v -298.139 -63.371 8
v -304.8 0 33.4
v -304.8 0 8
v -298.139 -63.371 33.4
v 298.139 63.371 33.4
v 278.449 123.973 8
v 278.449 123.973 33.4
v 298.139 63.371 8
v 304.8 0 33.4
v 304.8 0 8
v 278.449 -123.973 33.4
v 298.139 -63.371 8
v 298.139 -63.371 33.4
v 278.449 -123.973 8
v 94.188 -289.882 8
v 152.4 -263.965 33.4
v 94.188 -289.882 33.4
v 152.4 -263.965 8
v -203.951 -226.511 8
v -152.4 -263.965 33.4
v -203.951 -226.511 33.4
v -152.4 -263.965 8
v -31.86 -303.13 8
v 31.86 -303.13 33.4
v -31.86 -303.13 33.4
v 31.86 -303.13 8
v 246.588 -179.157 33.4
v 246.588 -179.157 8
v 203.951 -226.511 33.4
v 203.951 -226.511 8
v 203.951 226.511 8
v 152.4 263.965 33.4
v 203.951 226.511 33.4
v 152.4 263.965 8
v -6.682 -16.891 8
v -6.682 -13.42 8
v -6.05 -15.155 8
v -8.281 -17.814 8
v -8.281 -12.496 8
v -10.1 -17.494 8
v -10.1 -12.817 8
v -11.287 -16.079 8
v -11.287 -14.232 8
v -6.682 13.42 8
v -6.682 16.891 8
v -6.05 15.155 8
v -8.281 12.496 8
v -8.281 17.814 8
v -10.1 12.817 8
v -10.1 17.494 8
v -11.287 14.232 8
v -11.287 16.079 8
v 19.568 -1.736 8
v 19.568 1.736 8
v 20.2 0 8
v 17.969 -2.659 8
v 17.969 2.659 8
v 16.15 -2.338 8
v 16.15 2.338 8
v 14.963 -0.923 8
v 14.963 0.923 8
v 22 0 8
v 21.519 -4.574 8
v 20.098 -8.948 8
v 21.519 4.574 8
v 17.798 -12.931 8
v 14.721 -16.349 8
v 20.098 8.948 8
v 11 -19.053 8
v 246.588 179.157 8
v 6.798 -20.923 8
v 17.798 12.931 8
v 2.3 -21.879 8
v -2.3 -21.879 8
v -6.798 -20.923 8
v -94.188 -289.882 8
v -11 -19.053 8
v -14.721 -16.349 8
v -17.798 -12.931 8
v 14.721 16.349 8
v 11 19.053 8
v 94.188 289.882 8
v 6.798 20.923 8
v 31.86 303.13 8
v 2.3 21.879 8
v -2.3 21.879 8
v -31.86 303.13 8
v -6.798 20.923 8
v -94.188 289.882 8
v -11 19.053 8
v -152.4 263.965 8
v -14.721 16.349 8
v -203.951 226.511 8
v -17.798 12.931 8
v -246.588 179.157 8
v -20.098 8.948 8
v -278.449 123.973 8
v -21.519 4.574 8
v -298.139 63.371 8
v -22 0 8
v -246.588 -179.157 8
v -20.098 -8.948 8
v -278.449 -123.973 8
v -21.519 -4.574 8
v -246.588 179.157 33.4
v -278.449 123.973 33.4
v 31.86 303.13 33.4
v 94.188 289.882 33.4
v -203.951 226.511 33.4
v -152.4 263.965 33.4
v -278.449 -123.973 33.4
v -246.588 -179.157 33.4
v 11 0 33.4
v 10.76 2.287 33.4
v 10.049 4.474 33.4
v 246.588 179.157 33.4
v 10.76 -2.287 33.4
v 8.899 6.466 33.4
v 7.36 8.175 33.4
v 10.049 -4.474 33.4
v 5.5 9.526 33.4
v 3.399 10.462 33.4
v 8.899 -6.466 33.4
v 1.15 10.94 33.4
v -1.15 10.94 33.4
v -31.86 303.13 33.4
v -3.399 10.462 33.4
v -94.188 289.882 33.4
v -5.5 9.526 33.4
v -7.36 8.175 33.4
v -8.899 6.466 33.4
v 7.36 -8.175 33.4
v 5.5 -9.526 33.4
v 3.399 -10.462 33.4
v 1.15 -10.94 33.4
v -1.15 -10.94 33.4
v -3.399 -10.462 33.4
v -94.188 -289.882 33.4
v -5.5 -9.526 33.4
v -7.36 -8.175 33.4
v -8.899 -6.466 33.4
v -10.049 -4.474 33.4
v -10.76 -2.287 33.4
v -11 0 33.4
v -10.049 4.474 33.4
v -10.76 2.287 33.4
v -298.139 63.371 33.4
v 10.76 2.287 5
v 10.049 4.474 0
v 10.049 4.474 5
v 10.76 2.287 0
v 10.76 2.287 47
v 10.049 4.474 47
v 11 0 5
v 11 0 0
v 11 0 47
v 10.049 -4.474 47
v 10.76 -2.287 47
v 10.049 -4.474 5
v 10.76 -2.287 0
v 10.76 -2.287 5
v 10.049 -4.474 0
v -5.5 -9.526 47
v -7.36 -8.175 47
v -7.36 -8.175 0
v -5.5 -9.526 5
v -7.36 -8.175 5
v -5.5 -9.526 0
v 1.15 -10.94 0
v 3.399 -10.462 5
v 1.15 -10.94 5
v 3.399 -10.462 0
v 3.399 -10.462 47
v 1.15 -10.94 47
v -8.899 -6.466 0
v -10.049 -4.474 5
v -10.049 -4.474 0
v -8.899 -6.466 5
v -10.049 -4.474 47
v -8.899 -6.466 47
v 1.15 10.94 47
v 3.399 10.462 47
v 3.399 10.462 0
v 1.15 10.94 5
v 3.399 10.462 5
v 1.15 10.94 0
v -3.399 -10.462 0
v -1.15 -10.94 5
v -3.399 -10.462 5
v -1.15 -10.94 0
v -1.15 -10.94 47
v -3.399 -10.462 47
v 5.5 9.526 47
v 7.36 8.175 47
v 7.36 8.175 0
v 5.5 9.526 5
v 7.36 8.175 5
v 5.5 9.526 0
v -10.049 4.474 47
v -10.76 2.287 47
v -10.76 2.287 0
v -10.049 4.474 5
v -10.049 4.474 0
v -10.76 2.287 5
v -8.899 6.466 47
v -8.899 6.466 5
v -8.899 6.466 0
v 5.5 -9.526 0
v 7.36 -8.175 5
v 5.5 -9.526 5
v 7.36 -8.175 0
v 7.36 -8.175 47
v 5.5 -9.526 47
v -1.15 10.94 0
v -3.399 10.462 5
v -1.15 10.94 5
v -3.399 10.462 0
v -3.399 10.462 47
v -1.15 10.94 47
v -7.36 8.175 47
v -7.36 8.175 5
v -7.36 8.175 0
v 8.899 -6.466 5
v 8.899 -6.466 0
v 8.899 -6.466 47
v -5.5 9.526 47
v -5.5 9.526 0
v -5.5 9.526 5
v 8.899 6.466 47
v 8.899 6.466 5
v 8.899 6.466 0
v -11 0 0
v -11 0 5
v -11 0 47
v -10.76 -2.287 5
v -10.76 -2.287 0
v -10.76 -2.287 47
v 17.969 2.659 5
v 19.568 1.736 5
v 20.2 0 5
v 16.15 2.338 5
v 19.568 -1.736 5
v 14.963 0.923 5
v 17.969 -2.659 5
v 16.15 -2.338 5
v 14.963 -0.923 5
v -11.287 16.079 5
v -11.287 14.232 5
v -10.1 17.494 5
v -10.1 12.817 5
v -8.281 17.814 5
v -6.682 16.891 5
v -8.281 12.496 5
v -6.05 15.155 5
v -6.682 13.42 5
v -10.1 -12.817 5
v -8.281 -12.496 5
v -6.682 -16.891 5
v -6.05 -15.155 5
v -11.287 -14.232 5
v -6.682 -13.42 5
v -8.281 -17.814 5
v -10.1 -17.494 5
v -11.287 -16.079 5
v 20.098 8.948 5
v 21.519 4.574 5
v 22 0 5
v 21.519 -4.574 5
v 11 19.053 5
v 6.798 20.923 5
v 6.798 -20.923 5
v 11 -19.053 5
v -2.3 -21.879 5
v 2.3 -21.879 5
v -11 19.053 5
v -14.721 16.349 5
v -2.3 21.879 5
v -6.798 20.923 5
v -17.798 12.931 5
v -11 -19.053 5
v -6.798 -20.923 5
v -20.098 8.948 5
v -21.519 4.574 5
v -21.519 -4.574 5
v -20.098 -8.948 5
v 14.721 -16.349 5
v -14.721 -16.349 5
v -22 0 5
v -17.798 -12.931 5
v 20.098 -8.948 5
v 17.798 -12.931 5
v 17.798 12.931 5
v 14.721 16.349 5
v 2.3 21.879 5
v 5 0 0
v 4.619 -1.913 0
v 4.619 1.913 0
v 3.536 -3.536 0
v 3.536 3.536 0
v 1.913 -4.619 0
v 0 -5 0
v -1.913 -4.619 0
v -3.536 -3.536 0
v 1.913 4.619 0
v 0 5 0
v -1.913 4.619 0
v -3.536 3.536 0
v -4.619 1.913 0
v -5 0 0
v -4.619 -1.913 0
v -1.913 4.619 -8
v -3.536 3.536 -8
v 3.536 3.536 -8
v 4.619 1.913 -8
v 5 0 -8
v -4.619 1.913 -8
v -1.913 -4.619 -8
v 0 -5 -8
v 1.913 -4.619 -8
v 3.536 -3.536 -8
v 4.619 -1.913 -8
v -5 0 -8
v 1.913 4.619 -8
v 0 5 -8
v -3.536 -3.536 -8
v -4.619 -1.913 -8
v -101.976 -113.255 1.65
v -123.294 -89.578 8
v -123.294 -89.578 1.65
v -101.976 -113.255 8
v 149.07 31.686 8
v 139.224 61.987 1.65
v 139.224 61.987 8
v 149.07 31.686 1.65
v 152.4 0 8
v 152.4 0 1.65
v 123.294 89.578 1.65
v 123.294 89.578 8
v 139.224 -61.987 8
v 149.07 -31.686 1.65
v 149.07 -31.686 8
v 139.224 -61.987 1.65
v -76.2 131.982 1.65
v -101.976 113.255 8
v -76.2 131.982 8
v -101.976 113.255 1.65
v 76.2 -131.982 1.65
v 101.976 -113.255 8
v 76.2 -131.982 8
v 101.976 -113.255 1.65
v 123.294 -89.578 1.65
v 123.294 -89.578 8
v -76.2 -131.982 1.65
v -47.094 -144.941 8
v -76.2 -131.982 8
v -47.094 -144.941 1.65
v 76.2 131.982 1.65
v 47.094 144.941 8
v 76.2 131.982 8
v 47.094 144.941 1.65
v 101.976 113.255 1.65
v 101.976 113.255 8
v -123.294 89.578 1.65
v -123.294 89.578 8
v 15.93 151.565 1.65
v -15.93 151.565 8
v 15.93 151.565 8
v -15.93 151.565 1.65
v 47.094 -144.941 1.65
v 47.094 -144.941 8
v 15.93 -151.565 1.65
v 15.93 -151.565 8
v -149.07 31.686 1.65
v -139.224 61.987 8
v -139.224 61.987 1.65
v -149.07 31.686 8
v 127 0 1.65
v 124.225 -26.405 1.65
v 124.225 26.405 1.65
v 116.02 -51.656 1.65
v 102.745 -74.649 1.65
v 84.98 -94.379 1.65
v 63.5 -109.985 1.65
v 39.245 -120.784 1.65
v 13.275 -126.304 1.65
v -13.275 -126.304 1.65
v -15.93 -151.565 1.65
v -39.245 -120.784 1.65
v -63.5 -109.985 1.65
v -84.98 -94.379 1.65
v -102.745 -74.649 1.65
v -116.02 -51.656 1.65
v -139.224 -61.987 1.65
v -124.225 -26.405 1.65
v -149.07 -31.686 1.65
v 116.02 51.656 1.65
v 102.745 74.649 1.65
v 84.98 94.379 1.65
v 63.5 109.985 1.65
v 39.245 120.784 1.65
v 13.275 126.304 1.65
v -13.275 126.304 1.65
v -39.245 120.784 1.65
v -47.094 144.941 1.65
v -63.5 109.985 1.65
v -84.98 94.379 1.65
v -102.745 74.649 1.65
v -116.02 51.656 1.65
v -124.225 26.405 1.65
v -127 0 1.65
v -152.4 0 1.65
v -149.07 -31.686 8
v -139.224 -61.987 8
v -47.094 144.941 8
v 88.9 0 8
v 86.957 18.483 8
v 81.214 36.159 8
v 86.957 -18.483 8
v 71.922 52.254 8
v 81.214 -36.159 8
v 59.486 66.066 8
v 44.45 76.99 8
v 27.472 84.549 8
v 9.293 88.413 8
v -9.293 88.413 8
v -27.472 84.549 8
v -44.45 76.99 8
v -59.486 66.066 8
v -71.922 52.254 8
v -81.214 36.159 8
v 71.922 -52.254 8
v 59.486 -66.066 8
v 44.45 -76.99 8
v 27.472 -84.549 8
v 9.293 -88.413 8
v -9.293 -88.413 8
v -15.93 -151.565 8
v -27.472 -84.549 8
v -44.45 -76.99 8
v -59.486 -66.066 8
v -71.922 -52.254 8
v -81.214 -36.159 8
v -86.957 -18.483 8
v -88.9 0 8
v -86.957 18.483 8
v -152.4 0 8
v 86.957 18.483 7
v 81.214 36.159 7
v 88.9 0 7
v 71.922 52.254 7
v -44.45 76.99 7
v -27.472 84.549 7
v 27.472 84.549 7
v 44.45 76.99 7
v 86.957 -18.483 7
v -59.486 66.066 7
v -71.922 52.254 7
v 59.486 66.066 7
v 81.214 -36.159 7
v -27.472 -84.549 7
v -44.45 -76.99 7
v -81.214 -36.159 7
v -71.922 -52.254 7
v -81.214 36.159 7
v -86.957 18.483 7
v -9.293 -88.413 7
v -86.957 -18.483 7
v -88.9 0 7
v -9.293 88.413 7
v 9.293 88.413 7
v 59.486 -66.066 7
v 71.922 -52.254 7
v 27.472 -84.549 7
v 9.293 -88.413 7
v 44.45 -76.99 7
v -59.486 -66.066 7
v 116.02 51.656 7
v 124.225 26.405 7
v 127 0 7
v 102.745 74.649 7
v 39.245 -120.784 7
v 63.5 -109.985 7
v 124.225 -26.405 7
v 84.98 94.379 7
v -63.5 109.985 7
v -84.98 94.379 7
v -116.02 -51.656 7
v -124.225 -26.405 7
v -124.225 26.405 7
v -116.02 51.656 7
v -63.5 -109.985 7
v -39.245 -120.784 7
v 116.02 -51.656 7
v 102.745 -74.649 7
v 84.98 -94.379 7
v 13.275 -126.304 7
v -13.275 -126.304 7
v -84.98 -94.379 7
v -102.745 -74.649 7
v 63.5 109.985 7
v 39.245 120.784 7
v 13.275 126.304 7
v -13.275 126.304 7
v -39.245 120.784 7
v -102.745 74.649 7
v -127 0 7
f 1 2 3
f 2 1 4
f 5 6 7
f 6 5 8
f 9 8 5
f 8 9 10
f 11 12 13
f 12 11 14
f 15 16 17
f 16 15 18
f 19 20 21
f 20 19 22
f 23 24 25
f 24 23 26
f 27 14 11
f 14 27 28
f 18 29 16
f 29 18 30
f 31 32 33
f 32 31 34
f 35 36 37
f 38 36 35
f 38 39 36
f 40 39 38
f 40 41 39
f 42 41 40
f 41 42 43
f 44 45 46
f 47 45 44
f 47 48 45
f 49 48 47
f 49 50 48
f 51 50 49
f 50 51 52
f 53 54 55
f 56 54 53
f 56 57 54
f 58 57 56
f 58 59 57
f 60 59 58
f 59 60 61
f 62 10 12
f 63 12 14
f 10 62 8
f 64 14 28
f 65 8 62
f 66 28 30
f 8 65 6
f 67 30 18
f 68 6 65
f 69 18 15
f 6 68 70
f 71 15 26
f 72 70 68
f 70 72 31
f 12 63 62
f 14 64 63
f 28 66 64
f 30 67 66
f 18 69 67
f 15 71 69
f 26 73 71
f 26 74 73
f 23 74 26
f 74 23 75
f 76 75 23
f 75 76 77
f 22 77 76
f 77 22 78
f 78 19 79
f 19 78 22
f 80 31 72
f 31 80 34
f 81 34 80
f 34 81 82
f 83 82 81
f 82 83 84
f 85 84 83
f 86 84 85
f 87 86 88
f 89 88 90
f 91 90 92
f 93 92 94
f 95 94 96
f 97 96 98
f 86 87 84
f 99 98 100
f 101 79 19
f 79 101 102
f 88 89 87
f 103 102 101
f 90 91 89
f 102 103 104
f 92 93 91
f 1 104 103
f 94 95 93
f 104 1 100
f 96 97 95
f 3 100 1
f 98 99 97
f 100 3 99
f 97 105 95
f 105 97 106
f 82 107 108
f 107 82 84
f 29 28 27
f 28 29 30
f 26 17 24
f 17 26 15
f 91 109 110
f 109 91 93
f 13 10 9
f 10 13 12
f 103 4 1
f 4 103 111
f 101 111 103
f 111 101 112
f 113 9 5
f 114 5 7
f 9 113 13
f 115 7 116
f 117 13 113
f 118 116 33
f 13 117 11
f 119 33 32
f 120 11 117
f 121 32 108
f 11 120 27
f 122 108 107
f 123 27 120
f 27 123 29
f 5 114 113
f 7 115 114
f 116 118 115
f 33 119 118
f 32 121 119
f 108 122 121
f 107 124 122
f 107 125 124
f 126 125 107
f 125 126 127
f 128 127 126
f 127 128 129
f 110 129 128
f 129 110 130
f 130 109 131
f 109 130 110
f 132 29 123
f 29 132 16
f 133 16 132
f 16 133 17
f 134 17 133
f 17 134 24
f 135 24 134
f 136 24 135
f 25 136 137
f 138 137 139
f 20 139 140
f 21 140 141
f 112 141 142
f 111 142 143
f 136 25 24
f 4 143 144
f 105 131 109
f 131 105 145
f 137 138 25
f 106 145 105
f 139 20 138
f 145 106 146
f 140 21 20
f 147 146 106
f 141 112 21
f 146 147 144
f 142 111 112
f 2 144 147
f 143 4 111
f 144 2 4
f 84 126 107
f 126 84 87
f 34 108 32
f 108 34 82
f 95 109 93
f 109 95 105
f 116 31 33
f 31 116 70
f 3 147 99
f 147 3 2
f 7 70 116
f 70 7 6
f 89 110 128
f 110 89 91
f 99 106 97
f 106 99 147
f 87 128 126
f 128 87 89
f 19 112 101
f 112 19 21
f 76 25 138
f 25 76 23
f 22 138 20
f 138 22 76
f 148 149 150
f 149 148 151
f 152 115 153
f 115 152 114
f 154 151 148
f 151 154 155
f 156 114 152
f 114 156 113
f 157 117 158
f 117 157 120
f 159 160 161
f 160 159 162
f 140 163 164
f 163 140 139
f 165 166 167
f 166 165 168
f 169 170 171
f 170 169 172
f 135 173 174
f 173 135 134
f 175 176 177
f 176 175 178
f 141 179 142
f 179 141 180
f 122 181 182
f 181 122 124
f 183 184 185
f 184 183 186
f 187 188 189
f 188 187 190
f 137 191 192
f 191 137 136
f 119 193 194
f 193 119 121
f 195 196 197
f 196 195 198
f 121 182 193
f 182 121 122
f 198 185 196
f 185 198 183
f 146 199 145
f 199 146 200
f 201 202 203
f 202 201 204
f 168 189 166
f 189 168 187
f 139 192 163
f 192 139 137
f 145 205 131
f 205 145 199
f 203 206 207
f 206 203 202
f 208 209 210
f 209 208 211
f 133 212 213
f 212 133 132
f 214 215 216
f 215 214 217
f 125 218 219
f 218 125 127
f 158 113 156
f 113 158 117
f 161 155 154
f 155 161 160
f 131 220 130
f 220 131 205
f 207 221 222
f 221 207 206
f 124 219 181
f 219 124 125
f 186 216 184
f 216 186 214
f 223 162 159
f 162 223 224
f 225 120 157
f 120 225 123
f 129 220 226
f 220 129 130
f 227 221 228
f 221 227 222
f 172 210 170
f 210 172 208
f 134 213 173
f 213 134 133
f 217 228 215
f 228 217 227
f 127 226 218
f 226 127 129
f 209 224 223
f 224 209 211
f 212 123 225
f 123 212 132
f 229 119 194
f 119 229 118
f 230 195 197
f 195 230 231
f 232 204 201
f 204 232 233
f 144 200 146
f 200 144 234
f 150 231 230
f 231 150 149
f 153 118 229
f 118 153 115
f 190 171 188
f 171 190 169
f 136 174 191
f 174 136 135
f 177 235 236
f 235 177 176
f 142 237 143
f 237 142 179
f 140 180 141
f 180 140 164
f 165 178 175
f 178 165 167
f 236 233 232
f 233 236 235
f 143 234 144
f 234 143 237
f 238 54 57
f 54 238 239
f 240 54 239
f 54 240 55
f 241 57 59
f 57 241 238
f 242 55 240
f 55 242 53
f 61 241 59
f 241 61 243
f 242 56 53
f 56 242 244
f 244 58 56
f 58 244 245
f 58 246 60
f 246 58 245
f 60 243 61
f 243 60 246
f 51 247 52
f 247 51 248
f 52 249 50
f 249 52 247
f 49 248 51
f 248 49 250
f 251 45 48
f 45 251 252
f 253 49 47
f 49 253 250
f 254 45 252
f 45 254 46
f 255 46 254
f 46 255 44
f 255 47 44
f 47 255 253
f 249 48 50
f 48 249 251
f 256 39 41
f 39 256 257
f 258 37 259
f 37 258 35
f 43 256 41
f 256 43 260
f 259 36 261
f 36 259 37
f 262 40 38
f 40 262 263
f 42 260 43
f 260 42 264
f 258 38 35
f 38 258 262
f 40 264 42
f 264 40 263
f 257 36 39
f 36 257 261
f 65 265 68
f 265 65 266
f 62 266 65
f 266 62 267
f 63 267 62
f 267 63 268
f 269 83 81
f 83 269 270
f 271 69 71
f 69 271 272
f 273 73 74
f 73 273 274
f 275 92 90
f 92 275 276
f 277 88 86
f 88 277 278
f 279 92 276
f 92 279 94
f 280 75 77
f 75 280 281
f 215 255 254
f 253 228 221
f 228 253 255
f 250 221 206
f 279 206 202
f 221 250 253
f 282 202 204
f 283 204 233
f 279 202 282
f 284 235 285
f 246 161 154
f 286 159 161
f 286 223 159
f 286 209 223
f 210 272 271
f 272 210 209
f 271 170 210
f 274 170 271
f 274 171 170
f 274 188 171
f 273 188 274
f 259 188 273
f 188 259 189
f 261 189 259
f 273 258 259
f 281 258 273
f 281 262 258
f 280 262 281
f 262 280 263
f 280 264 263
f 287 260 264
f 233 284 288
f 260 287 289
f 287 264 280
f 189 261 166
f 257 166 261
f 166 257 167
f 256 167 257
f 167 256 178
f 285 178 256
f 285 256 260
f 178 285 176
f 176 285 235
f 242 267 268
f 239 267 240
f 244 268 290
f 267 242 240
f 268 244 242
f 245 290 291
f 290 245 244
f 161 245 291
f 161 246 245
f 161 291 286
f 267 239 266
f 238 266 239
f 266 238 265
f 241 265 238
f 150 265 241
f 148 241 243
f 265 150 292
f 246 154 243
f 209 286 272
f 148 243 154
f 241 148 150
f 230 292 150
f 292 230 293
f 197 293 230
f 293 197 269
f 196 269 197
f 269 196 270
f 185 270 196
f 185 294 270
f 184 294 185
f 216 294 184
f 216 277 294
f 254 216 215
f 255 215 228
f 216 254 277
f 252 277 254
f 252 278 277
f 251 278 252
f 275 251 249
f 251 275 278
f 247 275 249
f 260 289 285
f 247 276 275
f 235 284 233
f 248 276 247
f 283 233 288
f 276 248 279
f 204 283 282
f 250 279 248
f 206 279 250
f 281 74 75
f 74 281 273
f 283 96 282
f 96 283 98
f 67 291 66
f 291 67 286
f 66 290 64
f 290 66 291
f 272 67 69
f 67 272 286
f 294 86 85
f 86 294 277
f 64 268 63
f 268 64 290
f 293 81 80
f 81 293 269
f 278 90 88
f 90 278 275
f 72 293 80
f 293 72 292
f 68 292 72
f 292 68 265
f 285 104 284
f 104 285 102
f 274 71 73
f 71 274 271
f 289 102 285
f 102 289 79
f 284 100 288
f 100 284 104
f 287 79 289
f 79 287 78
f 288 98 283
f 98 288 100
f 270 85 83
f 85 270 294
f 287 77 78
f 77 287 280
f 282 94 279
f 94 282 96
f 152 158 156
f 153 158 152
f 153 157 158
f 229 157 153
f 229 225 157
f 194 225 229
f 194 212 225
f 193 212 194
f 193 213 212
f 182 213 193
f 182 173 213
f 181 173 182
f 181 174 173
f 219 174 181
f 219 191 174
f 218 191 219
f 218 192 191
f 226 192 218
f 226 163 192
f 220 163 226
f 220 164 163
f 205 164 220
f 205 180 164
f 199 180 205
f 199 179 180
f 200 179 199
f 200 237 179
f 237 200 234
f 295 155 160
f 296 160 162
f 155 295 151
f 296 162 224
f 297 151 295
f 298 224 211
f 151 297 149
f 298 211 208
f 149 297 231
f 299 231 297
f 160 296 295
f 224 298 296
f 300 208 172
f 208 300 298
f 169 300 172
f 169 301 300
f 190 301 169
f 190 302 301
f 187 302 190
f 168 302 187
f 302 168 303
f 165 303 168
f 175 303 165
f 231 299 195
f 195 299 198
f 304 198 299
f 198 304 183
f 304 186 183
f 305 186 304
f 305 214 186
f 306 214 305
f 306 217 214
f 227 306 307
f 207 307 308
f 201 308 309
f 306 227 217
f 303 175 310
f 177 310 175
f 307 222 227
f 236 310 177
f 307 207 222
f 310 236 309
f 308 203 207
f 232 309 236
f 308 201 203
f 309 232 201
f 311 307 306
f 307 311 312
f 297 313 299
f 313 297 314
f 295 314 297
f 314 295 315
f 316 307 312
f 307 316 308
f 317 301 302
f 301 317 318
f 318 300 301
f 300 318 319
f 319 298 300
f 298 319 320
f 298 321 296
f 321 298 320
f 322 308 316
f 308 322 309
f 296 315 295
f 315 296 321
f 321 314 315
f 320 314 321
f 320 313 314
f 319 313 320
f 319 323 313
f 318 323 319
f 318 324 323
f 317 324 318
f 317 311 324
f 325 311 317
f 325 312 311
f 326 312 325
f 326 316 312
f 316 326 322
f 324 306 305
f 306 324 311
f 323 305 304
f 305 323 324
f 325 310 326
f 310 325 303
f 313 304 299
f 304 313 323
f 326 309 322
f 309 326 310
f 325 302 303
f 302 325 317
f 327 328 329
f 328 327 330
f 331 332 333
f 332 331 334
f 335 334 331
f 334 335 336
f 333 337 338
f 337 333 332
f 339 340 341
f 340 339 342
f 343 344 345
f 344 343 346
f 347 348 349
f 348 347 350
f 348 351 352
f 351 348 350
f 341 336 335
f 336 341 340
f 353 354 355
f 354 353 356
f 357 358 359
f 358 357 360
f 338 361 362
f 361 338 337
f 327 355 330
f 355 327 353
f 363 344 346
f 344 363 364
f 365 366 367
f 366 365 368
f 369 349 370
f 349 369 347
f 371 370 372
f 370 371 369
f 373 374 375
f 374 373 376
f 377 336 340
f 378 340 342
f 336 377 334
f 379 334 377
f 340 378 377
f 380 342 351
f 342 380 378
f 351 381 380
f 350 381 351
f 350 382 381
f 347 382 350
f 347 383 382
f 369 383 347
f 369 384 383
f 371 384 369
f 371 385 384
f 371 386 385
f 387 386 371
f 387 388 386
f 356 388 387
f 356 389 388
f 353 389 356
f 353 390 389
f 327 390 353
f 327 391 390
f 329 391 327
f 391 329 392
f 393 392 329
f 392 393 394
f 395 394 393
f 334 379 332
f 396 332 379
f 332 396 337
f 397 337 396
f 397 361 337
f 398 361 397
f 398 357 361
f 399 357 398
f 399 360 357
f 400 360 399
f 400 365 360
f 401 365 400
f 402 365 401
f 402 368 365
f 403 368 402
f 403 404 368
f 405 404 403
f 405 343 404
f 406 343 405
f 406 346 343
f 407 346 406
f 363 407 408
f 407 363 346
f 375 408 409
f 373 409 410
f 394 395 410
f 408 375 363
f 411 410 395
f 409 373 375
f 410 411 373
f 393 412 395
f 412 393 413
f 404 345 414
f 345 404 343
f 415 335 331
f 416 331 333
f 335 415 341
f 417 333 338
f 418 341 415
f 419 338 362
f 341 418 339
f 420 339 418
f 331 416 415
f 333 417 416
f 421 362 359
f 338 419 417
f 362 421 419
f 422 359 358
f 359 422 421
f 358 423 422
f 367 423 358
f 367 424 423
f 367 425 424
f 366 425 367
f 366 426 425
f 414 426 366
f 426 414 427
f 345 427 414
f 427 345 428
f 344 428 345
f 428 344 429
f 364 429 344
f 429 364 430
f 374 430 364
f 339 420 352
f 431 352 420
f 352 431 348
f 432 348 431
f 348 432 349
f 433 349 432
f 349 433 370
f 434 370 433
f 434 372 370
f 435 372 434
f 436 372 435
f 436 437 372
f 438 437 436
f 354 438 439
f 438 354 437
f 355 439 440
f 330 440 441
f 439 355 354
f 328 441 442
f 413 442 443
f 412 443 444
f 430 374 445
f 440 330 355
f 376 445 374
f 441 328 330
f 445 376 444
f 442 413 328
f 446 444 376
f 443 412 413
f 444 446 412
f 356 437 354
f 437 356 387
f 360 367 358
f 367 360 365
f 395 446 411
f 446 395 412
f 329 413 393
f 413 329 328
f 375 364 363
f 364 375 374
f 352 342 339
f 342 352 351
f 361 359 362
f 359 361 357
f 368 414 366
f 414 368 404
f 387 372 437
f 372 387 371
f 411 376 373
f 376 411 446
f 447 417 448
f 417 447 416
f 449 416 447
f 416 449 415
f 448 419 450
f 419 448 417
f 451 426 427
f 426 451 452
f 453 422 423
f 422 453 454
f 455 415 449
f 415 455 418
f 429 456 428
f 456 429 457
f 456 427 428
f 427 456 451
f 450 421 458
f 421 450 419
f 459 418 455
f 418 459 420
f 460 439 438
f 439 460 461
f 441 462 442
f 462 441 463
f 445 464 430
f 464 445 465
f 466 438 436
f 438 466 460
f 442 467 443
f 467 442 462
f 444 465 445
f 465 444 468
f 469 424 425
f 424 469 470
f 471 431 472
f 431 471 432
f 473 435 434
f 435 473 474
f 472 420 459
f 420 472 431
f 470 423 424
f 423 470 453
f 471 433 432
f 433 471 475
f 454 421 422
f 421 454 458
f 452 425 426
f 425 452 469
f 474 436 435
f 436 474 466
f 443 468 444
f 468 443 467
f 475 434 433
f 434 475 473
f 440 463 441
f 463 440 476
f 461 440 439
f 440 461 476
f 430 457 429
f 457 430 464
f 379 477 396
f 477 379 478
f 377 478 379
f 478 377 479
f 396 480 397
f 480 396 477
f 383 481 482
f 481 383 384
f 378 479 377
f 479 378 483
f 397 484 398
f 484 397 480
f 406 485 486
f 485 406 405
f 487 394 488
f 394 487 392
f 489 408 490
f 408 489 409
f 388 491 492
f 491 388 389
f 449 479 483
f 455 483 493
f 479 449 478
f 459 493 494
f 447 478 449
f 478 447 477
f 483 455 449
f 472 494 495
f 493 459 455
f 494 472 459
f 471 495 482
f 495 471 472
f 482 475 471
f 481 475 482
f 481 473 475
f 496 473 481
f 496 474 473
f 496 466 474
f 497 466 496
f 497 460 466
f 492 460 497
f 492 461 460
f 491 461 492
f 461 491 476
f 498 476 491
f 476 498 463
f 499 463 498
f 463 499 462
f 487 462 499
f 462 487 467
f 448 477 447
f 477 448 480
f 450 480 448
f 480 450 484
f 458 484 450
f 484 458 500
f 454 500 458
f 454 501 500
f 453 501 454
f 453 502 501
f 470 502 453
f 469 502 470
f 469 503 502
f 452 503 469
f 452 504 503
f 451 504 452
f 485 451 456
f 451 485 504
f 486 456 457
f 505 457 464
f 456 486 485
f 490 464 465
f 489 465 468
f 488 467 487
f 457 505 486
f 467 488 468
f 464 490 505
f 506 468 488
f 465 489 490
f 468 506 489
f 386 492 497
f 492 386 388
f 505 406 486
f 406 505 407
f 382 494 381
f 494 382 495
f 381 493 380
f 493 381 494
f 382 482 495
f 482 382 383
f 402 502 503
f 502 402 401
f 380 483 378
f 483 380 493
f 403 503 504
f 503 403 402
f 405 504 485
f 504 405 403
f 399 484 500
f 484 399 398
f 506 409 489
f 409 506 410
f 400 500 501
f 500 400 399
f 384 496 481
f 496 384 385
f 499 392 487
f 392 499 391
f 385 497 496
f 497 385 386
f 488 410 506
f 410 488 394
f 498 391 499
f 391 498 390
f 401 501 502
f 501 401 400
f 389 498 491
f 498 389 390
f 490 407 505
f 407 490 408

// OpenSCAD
// Convert inches to mm
function inches (x) = x * 25.4;

// Logisaf CM-3P30
// 30A, 3 wires, 600VDC/VAC
module slipRing () {
    color("SlateGray") {
        cylinder(h=47,d=22);
        translate([0,0,-8]) cylinder(h=8,d=10);
        translate([0,0,5]) difference() {
            cylinder(h=3,d=44);
            for (a=[0,120,240]) {
                rotate([0,0,a])
                translate([35/2,0,-0.5])
                cylinder(h=4,d=5.4);
            }
        }
    }
}

module disk (h,d) {
    color("Moccasin")
    difference() {
        cylinder(h=h,d=d);
        translate([0,0,-0.5]) cylinder(h=h+1,d=22);
    }
}

// Shepherd Hardware 9549
// 12in lazy susan, 1000lb load capacity
module bearing () {
    // These dimensions are not known exactly.
    // No technical drawing was available. 
    h=inches(1/4);
    od=inches(12);
    id0=inches(7);
    id1=inches(10);
    color("Silver") difference() {
        cylinder(h=h,d=od);
        translate([0,0,0.5]) cylinder(h=h+5,d=id0);
        translate([0,0,-2]) cylinder(h=h+1,d=id1);
    }
}

module poweredSusan () {
    translate([0,0,8]) 
    disk(h=inches(1), d=inches(24));
    slipRing();
    translate([0,0,8-inches(1/4)]) bearing();
}

poweredSusan();
